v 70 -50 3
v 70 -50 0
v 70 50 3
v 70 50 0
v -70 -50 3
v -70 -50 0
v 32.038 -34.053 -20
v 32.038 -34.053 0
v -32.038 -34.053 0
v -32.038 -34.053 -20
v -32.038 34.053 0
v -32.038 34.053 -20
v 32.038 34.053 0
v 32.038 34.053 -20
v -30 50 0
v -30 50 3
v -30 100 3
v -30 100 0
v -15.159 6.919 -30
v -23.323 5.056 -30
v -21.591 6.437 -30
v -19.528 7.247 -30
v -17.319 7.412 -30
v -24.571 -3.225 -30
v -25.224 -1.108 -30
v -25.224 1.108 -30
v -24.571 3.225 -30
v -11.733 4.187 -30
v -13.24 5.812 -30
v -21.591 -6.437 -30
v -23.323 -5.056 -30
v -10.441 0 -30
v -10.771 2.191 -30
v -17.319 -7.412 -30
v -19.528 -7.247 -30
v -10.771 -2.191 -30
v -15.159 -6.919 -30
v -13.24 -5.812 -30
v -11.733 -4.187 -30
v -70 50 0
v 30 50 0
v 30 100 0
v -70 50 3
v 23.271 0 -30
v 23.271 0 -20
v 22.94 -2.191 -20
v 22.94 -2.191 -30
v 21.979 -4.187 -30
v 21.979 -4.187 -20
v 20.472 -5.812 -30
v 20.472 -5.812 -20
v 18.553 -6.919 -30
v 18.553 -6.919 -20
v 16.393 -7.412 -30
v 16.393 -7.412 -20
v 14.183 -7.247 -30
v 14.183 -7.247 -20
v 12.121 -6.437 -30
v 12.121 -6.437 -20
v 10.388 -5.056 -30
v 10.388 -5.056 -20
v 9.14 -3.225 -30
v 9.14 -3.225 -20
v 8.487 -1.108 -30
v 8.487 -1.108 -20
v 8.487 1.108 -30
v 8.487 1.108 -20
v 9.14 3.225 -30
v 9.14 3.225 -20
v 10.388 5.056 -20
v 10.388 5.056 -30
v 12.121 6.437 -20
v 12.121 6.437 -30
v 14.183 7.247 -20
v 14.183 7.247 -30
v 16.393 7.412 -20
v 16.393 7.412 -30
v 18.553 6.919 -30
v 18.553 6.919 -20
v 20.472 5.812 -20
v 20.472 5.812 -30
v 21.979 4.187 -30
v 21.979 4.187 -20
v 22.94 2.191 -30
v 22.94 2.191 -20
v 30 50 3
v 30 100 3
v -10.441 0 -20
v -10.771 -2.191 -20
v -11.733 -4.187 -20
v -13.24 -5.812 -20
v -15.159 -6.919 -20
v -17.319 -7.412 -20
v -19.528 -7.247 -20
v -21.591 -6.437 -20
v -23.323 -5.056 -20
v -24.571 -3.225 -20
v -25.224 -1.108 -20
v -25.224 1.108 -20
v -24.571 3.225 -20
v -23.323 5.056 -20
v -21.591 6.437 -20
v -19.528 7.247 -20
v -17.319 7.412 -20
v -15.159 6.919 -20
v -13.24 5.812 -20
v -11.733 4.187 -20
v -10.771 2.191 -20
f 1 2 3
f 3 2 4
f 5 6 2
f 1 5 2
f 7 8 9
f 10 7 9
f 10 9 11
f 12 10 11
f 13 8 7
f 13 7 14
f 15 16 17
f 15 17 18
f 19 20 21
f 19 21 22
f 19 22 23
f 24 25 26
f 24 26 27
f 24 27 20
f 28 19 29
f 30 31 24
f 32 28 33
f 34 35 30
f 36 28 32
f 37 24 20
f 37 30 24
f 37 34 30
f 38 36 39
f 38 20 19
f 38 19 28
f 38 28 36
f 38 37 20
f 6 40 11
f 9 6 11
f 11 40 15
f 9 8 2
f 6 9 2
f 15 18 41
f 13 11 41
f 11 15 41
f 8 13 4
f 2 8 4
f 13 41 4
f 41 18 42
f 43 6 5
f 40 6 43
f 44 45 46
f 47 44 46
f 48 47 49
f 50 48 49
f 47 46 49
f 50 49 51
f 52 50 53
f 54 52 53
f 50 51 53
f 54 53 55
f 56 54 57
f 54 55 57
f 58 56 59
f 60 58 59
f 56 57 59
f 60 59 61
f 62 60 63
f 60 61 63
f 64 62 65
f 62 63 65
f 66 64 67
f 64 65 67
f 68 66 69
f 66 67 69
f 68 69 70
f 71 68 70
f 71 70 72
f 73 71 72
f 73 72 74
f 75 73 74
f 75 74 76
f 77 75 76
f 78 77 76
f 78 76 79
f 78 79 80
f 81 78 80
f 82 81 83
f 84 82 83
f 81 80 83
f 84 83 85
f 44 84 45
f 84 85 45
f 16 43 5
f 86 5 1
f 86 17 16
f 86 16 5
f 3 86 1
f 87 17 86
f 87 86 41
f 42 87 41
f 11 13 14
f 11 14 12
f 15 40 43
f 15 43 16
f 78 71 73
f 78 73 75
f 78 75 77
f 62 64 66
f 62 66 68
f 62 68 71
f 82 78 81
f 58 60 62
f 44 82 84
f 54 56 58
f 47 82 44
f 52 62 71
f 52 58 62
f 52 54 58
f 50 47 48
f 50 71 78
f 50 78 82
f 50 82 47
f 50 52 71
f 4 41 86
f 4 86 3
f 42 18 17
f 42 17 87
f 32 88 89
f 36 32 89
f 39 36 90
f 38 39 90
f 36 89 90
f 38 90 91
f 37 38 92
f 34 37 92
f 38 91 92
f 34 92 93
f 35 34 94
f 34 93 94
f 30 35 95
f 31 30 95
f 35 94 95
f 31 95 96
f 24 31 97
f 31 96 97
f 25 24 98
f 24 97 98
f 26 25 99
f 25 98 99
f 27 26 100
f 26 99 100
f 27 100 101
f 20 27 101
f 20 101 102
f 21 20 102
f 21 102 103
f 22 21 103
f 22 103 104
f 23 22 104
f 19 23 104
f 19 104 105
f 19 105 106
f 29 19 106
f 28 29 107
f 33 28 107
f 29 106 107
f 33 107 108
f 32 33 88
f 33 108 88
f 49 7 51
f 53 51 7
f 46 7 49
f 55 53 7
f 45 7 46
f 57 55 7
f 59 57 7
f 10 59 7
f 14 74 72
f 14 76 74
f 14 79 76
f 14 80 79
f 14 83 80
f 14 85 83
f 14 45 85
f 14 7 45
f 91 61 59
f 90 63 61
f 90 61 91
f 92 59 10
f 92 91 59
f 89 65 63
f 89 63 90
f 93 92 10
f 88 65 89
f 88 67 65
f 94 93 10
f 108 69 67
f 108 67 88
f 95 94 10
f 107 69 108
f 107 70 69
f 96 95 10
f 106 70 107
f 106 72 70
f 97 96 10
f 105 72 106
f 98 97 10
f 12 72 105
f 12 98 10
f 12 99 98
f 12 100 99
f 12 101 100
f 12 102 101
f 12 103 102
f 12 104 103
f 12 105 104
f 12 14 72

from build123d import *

# Parameters (mm, degrees)
SKETCH_1_W      = 140
SKETCH_1_H      = 100
EXTRUDE_1_DEPTH = 3
SKETCH_2_W      = 60
SKETCH_2_H      = 3
EXTRUDE_2_DEPTH = 50
SKETCH_3_W      = 64.075246498
SKETCH_3_H      = 68.106213914
EXTRUDE_3_DEPTH = 20
SKETCH_4_R      = 7.433229746
EXTRUDE_4_DEPTH = 10


with BuildPart() as part:
    # 草图1 → 凸台-拉伸1 (new body)
    with BuildSketch(Plane.XY):
        Rectangle(SKETCH_1_W, SKETCH_1_H)
    extrude(amount=EXTRUDE_1_DEPTH)

    # 草图2 → 凸台-拉伸2 (add)
    with BuildSketch(Plane(origin=(0, 50, 0), x_dir=(1, 0, 0), z_dir=(0, 1, 0))):
        with Locations((0, -1.5)):
            Rectangle(SKETCH_2_W, SKETCH_2_H)
    extrude(amount=EXTRUDE_2_DEPTH)

    # 草图3 → 凸台-拉伸3 (add)
    with BuildSketch(Plane(origin=(0, 0, 0), x_dir=(-1, 0, 0), z_dir=(0, 0, -1))):
        Rectangle(SKETCH_3_W, SKETCH_3_H)
    extrude(amount=EXTRUDE_3_DEPTH)

    # 草图4 → 凸台-拉伸4 (add)
    with BuildSketch(Plane(origin=(0, 0, -20), x_dir=(-1, 0, 0), z_dir=(0, 0, -1))):
        with Locations(Location((17.874179181, 0, 0), (0, 0, 180))):
            Circle(SKETCH_4_R)
        with Locations(Location((-15.837302871, 0, 0), (0, 0, 180))):
            Circle(SKETCH_4_R)
    extrude(amount=EXTRUDE_4_DEPTH)


solid = part.part
